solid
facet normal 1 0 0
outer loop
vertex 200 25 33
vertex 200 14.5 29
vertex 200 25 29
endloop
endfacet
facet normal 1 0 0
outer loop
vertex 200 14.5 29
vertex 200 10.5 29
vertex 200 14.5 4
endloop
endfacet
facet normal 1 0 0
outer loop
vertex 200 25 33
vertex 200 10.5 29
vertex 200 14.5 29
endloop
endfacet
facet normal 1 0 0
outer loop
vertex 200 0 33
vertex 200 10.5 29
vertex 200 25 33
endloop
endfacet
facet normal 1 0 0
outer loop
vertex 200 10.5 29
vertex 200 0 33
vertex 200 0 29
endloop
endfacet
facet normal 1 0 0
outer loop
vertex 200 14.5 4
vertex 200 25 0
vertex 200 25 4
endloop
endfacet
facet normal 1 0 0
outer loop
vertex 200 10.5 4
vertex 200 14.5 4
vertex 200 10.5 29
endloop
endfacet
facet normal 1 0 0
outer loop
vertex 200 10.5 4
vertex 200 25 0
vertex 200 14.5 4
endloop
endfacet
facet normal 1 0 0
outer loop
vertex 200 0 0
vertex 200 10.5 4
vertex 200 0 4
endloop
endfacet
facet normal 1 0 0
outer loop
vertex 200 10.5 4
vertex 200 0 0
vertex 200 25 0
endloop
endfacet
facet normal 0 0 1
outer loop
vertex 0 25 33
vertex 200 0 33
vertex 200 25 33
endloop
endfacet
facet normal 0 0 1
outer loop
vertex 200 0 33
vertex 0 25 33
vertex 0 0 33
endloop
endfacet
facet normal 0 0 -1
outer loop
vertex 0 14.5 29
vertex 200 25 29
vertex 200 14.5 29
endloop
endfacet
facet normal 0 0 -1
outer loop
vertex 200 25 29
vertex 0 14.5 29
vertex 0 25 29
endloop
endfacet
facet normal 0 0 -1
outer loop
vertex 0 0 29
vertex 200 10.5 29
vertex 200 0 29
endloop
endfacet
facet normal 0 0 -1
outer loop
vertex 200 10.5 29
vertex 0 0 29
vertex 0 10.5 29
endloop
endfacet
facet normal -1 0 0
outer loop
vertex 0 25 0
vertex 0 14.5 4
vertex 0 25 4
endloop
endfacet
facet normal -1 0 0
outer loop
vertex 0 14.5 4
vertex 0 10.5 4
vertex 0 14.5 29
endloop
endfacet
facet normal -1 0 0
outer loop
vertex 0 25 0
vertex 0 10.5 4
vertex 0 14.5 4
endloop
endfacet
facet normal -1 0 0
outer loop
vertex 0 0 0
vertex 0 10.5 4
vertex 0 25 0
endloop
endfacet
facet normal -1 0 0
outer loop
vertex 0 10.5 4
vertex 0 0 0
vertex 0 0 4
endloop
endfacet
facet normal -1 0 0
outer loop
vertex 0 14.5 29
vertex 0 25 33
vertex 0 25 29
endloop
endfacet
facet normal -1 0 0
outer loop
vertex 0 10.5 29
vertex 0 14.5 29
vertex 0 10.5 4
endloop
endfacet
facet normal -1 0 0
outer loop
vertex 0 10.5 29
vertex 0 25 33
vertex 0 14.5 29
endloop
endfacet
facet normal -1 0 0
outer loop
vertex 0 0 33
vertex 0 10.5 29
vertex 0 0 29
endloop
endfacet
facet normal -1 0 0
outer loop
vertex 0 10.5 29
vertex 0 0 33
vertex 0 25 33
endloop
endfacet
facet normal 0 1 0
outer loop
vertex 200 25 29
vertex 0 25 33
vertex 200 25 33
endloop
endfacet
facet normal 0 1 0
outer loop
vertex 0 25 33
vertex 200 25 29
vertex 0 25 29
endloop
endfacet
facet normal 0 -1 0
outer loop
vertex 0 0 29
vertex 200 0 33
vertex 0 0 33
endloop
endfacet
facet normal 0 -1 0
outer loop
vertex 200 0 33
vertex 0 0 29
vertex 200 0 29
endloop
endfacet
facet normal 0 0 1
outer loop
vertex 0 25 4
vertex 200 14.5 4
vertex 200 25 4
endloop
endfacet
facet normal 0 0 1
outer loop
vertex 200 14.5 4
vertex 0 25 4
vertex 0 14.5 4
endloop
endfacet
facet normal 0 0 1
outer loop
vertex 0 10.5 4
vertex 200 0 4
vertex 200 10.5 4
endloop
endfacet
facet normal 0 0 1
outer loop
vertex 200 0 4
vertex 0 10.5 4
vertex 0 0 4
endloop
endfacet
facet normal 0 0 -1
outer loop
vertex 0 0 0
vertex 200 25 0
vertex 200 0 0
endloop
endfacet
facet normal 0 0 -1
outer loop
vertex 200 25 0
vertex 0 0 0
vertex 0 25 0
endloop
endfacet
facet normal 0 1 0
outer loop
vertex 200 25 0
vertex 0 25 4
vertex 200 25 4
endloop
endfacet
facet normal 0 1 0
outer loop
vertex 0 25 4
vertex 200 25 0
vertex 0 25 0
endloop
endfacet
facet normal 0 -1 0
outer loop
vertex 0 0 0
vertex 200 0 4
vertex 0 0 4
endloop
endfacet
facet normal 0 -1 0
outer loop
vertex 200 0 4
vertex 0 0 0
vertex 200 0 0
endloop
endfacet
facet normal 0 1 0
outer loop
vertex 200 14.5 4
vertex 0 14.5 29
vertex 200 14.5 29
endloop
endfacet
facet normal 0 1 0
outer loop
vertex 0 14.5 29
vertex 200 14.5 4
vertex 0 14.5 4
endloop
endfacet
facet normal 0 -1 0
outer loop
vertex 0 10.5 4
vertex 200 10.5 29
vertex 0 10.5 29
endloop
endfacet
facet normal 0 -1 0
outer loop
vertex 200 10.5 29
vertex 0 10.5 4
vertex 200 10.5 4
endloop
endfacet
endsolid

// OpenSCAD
// Parameters
length = 200; // Length of the beam
width = 25;  // Width of the beam
height = 25+4+4; // Overall height of the beam
thickness = 4; // Thickness of the beam

// Derived parameters
flange_height = 4; // Height of the top and bottom flanges
web_height = height - 2 * flange_height; // Height of the vertical web

// I-beam structure
module ibeam() {
    // Top flange
    translate([0, 0, height - flange_height])
        cube([length, width, flange_height]);

    // Bottom flange
    cube([length, width, flange_height]);

    // Vertical web
    translate([0, (width - thickness) / 2, flange_height])
        cube([length, thickness, web_height]);
}

// Generate the I-beam
ibeam();
